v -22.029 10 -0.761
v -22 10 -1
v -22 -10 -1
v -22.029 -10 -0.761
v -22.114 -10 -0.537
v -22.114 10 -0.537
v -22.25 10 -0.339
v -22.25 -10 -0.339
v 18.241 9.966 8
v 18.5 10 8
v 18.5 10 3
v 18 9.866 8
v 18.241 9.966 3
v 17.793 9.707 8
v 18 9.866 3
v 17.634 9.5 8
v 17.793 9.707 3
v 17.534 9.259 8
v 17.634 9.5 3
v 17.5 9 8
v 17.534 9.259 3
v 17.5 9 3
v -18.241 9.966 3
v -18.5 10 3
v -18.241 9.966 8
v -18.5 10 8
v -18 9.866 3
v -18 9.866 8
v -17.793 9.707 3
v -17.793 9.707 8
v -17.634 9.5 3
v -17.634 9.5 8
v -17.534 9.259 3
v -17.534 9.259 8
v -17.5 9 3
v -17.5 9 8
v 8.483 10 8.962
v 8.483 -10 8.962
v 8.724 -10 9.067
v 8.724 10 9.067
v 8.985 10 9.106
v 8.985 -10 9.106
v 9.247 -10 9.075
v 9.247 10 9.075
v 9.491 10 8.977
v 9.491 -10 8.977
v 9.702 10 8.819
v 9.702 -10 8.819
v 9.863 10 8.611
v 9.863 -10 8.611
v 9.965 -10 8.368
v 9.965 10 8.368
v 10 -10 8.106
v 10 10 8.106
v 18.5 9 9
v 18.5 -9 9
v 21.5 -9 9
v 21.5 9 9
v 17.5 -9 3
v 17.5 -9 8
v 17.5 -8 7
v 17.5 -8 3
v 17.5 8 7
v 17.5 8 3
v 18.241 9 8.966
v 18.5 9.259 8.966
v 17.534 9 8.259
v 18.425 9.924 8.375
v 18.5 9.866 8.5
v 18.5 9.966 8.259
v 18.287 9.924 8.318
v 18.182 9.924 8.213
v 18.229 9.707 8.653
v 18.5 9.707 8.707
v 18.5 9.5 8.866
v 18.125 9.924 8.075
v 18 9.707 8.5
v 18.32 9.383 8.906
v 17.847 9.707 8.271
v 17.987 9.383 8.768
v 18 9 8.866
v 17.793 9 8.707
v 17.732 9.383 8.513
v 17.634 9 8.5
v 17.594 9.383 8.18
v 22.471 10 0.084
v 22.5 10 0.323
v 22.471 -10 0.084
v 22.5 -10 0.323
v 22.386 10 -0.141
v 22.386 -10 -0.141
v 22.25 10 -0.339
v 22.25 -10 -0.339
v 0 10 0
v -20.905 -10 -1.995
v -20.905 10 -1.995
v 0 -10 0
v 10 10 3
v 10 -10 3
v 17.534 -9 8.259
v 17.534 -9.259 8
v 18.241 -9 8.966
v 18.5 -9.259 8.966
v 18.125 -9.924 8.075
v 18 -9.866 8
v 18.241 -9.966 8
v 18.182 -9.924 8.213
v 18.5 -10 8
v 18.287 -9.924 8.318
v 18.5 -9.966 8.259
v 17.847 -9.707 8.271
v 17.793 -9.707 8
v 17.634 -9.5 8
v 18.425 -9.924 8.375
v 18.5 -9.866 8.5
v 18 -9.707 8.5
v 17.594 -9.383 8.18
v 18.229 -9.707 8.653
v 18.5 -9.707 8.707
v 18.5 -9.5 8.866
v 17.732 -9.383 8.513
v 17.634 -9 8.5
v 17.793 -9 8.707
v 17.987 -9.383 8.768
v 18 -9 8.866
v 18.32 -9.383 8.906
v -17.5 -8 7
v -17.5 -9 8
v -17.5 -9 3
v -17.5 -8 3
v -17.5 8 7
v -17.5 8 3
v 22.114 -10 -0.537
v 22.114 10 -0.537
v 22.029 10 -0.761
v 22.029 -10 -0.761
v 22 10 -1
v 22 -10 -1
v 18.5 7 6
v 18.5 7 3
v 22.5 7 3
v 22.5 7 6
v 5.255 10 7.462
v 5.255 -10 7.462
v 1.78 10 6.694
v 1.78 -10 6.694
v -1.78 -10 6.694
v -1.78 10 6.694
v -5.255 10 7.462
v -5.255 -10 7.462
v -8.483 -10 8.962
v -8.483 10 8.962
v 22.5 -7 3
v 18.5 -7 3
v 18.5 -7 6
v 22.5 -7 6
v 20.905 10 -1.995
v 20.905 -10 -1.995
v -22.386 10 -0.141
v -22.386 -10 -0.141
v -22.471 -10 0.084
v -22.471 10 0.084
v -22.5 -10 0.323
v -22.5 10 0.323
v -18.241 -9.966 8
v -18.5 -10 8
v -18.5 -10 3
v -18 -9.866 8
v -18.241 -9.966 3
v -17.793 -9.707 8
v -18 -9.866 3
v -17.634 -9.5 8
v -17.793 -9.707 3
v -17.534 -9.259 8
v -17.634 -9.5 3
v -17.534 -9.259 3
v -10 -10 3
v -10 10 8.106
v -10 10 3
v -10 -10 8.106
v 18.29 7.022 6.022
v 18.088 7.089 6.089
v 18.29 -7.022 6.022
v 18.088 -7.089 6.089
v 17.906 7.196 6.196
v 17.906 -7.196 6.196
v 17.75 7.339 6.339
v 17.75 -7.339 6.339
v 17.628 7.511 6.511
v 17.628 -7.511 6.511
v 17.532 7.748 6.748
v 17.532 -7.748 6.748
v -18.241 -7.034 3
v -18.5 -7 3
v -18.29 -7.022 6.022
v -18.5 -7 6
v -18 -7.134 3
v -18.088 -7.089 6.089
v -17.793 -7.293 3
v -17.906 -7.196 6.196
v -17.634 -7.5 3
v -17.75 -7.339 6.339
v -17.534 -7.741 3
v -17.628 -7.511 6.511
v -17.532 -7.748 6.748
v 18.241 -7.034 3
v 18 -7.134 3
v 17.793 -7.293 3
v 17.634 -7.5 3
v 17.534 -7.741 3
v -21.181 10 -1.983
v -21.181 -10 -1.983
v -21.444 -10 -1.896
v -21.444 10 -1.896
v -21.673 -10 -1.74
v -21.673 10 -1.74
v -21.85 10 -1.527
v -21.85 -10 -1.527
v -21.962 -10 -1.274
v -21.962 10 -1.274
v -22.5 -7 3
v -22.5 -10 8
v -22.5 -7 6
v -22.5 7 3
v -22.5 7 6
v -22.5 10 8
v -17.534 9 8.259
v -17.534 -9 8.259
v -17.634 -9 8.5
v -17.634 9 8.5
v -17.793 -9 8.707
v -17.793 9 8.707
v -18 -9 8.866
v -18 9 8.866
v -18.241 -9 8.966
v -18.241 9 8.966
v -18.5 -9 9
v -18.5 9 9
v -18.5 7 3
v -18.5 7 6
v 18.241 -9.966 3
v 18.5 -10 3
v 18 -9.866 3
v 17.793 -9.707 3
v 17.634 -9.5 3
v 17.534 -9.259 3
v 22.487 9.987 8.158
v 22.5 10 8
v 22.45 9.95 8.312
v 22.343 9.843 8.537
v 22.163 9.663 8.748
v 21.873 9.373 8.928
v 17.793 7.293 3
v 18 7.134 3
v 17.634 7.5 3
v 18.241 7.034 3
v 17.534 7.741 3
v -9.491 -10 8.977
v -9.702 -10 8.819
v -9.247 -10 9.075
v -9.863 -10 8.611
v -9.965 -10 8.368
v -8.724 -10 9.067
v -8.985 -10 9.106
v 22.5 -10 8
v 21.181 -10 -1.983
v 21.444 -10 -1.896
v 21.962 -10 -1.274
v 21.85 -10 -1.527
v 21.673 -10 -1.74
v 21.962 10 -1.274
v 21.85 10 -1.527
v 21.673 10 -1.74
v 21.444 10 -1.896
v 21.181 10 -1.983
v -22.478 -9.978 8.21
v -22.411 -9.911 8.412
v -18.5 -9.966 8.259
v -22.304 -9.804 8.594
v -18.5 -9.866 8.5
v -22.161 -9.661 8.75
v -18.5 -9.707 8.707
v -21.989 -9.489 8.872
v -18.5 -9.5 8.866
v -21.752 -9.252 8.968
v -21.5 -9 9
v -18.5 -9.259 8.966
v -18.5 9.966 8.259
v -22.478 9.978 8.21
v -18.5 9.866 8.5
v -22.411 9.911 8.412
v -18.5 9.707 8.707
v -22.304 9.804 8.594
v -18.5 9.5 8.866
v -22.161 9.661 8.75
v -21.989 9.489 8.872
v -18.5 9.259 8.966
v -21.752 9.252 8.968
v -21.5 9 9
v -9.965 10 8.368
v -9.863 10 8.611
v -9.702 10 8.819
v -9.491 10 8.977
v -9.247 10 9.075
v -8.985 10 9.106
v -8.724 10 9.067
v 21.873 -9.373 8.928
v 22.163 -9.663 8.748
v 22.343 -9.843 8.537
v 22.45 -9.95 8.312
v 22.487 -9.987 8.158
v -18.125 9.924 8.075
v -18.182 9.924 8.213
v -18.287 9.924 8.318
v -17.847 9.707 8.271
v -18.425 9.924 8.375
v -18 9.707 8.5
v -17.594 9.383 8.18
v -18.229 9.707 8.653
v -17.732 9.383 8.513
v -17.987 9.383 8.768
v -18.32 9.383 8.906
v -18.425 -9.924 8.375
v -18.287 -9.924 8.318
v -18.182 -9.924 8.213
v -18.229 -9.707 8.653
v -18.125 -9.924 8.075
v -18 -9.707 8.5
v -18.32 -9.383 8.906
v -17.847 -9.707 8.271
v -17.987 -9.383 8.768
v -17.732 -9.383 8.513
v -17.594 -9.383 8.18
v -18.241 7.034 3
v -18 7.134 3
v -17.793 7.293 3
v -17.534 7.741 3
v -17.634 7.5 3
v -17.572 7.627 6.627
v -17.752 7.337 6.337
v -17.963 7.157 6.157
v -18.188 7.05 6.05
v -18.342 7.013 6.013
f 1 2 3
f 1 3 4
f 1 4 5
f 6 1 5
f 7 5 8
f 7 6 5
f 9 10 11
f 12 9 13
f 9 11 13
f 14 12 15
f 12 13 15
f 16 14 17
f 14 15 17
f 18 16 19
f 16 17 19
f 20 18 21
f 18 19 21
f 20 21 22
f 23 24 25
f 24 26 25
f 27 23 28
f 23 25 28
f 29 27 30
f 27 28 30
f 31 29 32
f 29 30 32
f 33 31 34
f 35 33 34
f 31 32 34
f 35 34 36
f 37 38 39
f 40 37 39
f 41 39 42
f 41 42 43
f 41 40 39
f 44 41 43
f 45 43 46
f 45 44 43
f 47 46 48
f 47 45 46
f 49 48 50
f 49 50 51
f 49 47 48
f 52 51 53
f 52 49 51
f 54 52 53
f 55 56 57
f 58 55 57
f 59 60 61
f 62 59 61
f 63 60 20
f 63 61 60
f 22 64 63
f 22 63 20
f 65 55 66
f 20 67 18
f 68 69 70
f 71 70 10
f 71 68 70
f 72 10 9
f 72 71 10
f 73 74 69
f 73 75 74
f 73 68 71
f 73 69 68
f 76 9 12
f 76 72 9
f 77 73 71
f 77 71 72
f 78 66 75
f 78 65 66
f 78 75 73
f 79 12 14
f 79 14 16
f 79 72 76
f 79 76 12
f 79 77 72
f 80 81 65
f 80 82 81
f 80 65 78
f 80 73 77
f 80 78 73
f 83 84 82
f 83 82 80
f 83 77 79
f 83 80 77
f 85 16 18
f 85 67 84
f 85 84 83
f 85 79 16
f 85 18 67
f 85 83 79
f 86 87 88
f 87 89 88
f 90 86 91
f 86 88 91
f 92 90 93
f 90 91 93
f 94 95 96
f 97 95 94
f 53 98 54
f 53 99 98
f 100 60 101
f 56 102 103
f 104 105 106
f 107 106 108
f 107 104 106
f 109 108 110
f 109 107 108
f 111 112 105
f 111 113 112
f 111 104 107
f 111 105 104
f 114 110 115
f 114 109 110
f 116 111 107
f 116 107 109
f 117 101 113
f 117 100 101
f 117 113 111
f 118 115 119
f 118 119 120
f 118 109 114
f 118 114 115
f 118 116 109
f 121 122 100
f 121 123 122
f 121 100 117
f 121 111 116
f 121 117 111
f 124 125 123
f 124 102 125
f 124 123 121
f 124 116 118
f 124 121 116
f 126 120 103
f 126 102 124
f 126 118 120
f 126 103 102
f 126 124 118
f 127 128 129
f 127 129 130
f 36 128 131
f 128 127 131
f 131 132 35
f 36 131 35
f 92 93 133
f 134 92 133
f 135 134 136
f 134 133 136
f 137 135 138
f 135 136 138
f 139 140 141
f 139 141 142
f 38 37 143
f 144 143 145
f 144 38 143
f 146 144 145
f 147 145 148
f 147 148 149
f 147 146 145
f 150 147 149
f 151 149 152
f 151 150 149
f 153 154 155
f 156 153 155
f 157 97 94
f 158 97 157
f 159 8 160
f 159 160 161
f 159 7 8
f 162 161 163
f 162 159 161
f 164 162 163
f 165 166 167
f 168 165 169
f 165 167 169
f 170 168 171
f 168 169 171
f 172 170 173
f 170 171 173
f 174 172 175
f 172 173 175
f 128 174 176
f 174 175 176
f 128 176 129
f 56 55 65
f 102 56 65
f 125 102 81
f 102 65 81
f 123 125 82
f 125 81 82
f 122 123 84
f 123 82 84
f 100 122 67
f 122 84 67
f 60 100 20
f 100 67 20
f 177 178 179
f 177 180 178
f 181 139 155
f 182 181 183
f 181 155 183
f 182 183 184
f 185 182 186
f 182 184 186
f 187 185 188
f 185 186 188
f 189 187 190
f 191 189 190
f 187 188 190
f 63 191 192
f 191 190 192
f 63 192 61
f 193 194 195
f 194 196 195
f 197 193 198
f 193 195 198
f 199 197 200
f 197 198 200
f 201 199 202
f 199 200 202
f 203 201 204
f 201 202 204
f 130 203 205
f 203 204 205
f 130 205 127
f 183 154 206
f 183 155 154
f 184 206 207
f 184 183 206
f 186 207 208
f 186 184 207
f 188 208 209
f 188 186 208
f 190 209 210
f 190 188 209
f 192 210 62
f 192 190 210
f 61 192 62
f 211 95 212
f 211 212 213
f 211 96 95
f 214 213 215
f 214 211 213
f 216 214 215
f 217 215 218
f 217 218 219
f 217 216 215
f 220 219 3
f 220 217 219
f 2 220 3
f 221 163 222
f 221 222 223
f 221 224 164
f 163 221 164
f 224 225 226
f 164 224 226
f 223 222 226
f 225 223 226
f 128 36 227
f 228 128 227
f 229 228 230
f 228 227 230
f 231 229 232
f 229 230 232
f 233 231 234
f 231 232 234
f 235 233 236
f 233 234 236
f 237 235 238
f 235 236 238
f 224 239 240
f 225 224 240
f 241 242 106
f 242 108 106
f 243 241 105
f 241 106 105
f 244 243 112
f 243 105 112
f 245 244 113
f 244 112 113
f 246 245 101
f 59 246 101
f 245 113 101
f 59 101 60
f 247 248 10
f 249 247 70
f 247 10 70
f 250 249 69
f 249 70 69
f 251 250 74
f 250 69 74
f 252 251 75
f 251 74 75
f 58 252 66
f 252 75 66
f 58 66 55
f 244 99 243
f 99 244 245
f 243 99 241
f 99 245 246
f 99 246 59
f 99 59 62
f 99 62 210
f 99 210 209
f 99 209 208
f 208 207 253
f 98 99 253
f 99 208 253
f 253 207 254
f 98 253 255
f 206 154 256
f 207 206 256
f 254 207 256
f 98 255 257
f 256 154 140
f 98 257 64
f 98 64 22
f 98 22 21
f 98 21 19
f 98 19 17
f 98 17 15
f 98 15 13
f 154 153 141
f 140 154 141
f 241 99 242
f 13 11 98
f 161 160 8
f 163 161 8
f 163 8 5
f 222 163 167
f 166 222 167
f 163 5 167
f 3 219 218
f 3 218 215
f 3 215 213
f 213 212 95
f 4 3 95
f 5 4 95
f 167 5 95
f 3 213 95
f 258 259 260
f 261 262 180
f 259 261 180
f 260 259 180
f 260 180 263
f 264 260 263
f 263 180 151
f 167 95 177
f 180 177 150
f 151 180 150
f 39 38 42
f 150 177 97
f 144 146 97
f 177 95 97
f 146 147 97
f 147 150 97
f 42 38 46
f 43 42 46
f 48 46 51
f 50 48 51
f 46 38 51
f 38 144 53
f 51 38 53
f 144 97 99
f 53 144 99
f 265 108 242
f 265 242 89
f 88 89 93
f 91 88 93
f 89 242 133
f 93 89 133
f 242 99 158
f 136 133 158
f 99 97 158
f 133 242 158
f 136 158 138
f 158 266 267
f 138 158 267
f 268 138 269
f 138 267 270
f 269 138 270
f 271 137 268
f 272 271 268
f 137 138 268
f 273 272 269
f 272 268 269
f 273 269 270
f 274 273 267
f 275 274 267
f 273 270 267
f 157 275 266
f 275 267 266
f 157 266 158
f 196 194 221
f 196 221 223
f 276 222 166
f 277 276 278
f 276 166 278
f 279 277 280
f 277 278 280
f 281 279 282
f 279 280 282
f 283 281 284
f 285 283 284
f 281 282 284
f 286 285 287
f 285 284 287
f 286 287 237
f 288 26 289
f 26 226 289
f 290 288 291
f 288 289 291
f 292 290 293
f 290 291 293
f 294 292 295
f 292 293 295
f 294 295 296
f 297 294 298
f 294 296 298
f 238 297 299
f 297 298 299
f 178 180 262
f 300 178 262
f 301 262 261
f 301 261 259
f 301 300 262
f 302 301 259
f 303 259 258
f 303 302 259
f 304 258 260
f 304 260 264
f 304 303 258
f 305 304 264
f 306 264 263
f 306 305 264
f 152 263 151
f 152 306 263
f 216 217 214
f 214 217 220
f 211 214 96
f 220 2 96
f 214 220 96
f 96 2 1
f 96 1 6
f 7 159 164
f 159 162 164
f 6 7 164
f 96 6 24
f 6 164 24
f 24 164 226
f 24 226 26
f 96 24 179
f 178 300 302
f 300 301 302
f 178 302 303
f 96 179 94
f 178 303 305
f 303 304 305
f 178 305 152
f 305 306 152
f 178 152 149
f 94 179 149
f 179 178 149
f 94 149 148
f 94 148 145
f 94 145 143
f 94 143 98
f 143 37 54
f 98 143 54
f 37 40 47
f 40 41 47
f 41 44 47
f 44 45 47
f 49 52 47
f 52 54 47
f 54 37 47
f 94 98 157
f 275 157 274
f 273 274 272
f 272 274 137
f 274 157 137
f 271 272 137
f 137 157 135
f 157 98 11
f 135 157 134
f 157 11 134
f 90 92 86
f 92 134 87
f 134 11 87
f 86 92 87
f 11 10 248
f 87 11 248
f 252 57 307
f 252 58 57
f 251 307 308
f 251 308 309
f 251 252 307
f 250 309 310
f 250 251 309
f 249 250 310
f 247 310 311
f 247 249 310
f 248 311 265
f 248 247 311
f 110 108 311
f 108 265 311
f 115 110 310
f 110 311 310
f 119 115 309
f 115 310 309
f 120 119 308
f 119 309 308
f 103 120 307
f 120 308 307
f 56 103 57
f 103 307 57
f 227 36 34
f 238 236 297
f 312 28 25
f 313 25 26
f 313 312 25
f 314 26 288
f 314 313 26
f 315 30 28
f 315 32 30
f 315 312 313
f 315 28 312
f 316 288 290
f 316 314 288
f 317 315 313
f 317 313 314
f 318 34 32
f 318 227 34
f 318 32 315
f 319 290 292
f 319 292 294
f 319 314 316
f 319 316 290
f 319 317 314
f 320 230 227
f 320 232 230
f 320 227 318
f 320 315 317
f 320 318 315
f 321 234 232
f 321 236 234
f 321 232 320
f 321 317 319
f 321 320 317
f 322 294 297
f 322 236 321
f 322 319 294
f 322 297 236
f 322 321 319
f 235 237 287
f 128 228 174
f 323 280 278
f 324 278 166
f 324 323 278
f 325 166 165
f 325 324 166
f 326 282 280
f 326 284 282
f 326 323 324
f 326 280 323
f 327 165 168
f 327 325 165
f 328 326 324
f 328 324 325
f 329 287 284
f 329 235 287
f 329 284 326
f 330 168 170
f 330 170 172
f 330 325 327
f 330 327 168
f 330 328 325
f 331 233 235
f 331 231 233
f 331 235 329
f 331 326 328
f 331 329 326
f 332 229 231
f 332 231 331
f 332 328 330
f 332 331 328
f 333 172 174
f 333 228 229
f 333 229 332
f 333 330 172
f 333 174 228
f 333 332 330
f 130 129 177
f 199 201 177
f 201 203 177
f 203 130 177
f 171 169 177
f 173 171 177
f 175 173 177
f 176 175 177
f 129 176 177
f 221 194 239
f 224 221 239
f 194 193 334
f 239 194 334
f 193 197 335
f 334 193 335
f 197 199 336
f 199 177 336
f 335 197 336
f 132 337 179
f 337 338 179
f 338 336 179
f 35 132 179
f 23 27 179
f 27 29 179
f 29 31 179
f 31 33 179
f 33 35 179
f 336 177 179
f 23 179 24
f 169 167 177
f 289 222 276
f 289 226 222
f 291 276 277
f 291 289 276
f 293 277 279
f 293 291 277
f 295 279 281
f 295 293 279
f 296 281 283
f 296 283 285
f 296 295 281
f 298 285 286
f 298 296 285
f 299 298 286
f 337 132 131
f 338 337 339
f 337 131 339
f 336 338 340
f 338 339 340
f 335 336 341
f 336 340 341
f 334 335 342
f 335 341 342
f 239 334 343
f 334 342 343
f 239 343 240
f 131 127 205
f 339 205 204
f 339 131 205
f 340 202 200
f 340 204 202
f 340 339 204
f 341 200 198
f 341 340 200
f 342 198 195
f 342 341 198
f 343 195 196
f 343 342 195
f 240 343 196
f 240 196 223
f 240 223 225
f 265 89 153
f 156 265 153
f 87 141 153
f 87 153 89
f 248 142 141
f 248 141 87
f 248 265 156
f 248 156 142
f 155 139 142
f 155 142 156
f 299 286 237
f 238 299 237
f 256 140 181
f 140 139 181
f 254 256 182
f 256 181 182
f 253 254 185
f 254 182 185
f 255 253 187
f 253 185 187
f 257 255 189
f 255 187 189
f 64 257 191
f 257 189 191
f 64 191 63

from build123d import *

# Parameters (mm, degrees)
F0_W      = 50
F0_H      = 20
F1_DEPTH  = 3
F3_DEPTH  = 10
F4_DEPTH  = 10
F5_W      = 2.5
F5_H      = 20
F5_W_2    = 5
F6_DEPTH  = 6
F7_W      = 14
F7_H      = 3
F8_DEPTH  = 25
F9_W      = 14
F9_H      = 3
F10_DEPTH = 25
F12_DEPTH = 10
F13_DEPTH = 10
F14_R     = 0.99999
F15_R     = 1
F16_W     = 2.5
F16_H     = 20
F17_DEPTH = 25
F18_W     = 2.5
F18_H     = 20
F19_DEPTH = 25
F20_R     = 0.99999


# Not quite as in the source:
# - a fillet or chamfer is up to 0.001 mm smaller than in the source, because OpenCascade refuses the exact size


with BuildPart() as f1:
    # F0 (on Top) → F1 (new body)
    with BuildSketch(Plane.XY):
        Rectangle(F0_W, F0_H)
    extrude(amount=F1_DEPTH)

    # F2 (on Front) → F3 (join)
    with BuildSketch(Plane.XZ):
        Polygon((0, 0), (-22, 0), (-22, -2.1), align=None)
        Polygon((22, 0), (0, 0), (22, -2.1), align=None)
    extrude(amount=F3_DEPTH)

    # F4 (add): faces of the model
    f4_faces = [f1.faces().sort_by_distance(p)[0] for p in [
        (14.6666666667, 0, -0.7),
        (-14.6666666667, 0, -0.7),
    ]]
    extrude(f4_faces, amount=F4_DEPTH)

    # F5 (on face) → F6 (join)
    with BuildSketch(Plane.XY.offset(3)):
        with Locations((-23.75, 0)):
            Rectangle(F5_W, F5_H)
        with Locations((-20, 0)):
            Rectangle(F5_W_2, F5_H)
        with Locations((23.75, 0)):
            Rectangle(F5_W, F5_H)
        with Locations((20, 0)):
            Rectangle(F5_W_2, F5_H)
    extrude(amount=F6_DEPTH)

    # F7 (on face) → F8 (cut)
    with BuildSketch(Plane.YZ.offset(-17.5)):
        with Locations((0, 4.5)):
            Rectangle(F7_W, F7_H)
    extrude(amount=-F8_DEPTH, mode=Mode.SUBTRACT)

    # F9 (on face) → F10 (cut)
    with BuildSketch(Plane(origin=(17.5, 0, 0), x_dir=(0, -1, 0), z_dir=(-1, 0, 0))):
        with Locations((0, 4.5)):
            Rectangle(F9_W, F9_H)
    extrude(amount=-F10_DEPTH, mode=Mode.SUBTRACT)

    # F11 (on Front) → F12 (join)
    with BuildSketch(Plane.XZ):
        with BuildLine():
            Line((-10, 10), (-10, 3))
            Line((-10, 3), (10, 3))
            Line((10, 3), (10, 10))
            ThreePointArc((10, 10), (0, 6.5968126209), (-10, 10))
        make_face()
    extrude(amount=F12_DEPTH)

    # F13 (add): a face of the model
    f13_faces = [f1.faces().sort_by_distance(p)[0] for p in [
        (0, 0, 5.4458216504),
    ]]
    extrude(f13_faces, amount=F13_DEPTH)

    # F14 (radius 1 in the source; OpenCascade refuses exactly that, so slightly less here)
    f14_edges = [f1.edges().sort_by_distance(p)[0] for p in [
        (-17.5, 0, 9),
        (-25, 0, 0),
        (-22, 0, 0),
        (-22, 0, -2.1),
        (25, 0, 0),
        (22, 0, 0),
        (22, 0, -2.1),
        (17.5, 0, 9),
        (17.5, 0, 6),
        (25, 0, 6),
        (25, -7, 4.5),
        (17.5, -7, 4.5),
        (25, 7, 4.5),
        (17.5, 7, 4.5),
        (25, 0, 3),
        (-25, 0, 6),
        (-17.5, -7, 4.5),
        (-25, -7, 4.5),
        (-25, 0, 3),
        (-17.5, 0, 6),
        (-17.5, 7, 4.5),
    ]]
    fillet(f14_edges, radius=F14_R)

    # F15
    f15_edges = [f1.edges().sort_by_distance(p)[0] for p in [
        (-10, 0, 10),
        (10, 0, 10),
    ]]
    fillet(f15_edges, radius=F15_R)

    # F16 (on face) → F17 (cut)
    with BuildSketch(Plane.XY.offset(9)):
        with Locations((-23.75, 0)):
            Rectangle(F16_W, F16_H)
    extrude(amount=-F17_DEPTH, mode=Mode.SUBTRACT)

    # F18 (on face) → F19 (cut)
    with BuildSketch(Plane.XY.offset(9)):
        with Locations((23.75, 0)):
            Rectangle(F18_W, F18_H)
    extrude(amount=-F19_DEPTH, mode=Mode.SUBTRACT)

    # F20 (radius 1 in the source; OpenCascade refuses exactly that, so slightly less here)
    f20_edges = [f1.edges().sort_by_distance(p)[0] for p in [
        (-22.5, 0, -0.13397),
        (22.5, 0, -0.13397),
        (22.5, 0, 9),
        (20.499995, -10, 9),
        (20.499995, 10, 9),
        (-20.499995, 10, 9),
        (-22.5, 0, 9),
        (-20.499995, -10, 9),
    ]]
    fillet(f20_edges, radius=F20_R)


solid = f1.part
